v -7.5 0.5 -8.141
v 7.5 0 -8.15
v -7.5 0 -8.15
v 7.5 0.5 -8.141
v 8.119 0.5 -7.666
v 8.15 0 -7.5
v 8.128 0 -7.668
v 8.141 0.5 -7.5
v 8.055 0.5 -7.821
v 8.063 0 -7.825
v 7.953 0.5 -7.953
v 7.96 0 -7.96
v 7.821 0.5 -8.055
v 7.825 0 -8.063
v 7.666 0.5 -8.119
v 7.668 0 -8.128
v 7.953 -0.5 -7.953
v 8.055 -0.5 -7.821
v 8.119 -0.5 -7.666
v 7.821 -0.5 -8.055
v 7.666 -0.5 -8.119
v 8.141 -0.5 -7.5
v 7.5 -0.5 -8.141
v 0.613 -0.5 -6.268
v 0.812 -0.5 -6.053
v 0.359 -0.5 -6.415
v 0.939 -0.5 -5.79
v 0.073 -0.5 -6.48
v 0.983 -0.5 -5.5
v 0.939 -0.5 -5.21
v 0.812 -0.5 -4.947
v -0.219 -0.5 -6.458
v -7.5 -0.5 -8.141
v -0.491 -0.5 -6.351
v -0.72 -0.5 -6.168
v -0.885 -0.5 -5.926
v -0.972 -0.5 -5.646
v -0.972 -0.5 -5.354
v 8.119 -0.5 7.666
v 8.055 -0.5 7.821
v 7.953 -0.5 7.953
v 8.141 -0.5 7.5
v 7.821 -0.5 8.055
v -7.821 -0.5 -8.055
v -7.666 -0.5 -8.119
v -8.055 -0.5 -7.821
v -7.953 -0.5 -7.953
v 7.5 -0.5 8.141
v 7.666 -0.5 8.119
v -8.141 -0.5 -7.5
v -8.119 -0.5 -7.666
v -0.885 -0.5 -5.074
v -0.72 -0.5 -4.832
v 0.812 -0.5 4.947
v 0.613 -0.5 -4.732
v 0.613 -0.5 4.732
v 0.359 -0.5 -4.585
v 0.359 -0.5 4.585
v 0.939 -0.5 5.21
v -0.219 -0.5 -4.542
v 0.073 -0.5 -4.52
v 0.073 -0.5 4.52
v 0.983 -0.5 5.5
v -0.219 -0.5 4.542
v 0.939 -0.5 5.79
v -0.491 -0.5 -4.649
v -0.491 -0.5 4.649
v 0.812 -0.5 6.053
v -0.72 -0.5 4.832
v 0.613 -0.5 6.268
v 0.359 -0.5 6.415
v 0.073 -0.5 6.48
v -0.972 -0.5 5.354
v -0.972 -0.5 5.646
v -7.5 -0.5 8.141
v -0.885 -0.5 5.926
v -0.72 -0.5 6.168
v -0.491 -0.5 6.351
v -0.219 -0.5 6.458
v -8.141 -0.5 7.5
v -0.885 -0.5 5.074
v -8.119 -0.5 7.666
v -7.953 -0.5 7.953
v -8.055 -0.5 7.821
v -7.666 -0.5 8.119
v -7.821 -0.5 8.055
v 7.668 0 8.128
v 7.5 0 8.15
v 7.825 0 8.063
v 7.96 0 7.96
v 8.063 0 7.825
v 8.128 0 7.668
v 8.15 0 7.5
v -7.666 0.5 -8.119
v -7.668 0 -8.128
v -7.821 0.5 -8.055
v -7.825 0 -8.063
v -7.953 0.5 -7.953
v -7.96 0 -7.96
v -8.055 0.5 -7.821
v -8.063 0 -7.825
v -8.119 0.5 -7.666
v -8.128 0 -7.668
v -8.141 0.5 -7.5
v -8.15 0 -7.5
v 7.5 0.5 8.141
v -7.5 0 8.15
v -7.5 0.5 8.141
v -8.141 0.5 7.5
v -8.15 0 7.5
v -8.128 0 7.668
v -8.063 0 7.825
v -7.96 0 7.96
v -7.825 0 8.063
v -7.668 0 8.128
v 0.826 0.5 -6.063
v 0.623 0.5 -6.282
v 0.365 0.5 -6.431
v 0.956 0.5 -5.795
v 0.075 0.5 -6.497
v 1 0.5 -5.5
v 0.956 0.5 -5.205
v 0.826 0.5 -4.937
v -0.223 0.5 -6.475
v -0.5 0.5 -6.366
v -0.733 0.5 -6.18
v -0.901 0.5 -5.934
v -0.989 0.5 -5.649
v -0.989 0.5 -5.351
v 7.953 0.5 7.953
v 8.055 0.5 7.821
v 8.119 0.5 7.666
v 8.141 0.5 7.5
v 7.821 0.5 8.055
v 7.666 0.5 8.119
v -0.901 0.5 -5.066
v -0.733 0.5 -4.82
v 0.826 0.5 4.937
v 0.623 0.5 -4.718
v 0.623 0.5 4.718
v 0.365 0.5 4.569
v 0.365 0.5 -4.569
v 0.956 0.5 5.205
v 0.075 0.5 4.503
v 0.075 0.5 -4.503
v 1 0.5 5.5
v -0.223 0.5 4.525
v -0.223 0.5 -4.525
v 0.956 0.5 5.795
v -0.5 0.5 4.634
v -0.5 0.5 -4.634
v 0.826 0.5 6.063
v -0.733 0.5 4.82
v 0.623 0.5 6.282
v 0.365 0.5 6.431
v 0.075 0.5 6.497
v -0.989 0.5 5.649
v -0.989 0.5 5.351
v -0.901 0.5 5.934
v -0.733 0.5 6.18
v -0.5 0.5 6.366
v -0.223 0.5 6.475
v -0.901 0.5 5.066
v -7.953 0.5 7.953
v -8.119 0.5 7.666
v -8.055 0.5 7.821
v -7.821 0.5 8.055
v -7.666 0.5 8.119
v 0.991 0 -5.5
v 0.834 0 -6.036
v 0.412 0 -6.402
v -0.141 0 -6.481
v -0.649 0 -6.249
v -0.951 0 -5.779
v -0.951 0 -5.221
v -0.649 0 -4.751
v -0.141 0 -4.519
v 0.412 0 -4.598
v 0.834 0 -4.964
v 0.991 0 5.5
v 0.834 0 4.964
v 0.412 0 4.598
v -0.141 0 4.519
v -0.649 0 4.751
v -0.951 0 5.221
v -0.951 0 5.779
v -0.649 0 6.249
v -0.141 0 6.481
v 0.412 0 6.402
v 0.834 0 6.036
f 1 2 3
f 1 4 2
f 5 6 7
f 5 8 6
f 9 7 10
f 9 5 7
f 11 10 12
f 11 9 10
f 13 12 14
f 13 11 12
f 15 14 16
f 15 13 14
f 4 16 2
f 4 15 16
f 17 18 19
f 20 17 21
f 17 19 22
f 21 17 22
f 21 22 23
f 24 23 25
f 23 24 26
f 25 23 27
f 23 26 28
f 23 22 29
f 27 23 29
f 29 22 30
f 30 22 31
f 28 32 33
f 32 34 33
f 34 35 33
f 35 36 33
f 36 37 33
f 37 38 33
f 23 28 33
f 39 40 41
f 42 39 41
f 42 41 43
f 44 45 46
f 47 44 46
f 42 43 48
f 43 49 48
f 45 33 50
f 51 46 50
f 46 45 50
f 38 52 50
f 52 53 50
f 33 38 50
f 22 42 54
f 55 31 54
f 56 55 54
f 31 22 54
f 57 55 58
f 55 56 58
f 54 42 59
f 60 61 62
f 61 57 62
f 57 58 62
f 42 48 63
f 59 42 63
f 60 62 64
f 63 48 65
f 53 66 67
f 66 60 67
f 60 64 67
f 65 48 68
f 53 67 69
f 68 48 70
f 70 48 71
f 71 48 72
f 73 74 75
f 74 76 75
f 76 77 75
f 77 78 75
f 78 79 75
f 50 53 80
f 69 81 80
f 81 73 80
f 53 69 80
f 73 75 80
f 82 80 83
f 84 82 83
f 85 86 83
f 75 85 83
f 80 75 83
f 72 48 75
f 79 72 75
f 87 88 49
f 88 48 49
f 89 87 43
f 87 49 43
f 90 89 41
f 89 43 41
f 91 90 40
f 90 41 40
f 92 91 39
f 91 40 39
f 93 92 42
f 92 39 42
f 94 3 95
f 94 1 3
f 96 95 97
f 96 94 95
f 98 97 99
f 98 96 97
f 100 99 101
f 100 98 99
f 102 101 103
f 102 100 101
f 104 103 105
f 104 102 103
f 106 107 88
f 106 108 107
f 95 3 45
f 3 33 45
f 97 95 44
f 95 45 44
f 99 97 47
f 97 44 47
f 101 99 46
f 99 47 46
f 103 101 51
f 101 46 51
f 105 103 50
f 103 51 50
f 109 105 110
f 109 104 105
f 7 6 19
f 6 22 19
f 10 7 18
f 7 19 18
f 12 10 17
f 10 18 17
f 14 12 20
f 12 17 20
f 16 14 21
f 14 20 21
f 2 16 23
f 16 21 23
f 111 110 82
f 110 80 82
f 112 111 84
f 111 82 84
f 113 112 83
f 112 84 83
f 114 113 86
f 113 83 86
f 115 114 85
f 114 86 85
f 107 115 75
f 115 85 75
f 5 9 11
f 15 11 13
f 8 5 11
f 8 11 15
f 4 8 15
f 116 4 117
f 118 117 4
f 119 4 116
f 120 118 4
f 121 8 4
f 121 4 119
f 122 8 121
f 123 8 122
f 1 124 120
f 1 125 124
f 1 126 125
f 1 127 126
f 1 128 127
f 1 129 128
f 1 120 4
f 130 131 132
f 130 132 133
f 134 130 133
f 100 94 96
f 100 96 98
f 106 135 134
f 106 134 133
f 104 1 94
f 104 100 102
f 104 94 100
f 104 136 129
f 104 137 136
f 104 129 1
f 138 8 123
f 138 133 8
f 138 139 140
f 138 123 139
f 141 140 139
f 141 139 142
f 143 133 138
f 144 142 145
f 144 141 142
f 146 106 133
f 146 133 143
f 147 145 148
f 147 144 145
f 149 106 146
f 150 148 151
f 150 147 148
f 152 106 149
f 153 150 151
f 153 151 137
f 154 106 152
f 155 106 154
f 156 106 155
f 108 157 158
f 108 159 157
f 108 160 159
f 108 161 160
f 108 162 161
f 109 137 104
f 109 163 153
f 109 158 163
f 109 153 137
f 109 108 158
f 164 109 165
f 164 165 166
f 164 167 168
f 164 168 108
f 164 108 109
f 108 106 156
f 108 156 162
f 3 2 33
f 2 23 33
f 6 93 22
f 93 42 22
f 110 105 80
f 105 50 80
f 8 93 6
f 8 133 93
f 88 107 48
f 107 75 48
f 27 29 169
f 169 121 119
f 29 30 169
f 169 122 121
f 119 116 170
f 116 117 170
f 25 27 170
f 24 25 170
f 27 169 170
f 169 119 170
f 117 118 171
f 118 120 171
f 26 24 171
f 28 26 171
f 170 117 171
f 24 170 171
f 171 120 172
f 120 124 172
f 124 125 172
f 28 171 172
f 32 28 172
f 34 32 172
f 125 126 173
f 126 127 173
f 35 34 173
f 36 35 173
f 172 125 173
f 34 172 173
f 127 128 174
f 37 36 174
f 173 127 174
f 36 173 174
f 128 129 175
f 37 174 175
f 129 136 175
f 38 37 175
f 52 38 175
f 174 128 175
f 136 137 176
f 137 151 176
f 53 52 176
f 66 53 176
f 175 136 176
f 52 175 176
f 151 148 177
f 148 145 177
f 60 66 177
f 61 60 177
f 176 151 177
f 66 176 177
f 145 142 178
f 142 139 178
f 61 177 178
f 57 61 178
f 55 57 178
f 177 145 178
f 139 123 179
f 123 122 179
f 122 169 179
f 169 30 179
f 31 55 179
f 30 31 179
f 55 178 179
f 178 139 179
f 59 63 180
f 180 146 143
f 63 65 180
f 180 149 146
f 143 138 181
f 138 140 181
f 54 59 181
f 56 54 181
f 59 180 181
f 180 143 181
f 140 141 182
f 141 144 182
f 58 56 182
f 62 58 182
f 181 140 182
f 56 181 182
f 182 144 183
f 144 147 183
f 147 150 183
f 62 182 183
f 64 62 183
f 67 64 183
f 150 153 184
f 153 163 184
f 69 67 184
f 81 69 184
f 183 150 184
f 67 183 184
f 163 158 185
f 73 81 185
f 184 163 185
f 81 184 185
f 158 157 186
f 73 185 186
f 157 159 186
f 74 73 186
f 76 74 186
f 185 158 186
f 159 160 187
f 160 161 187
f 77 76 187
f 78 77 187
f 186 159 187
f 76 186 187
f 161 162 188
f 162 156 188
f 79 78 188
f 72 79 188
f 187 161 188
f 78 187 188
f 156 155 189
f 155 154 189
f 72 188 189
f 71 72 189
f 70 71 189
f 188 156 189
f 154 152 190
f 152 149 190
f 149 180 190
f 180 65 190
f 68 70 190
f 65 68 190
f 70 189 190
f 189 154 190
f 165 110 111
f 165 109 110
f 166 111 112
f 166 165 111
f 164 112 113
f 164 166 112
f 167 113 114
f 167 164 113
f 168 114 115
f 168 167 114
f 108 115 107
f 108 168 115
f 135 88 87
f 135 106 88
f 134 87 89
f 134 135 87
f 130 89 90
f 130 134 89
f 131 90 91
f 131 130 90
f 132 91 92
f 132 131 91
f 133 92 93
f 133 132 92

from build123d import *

# Parameters (mm, degrees)
BOSS_EXTRUDE1_DEPTH           = 0.5
BOSS_EXTRUDE1_TAPER           = 1
BOSS_EXTRUDE1_OTHER_WAY_DEPTH = 0.5
BOSS_EXTRUDE1_OTHER_WAY_TAPER = 1
SKETCH3_R                     = 1
CUT_EXTRUDE1_DEPTH            = 10
CUT_EXTRUDE1_DRAFT            = -1
CUT_EXTRUDE1_PROFILE_2_DEPTH  = 10
CUT_EXTRUDE1_PROFILE_2_DRAFT  = -1


with BuildPart() as part:
    # Sketch2 → Boss-Extrude1 (new body)
    with BuildSketch(Plane(origin=(0, 0, 0), x_dir=(1, 0, 0), z_dir=(0, 1, 0))):
        with BuildLine():
            Line((-8.149946685, 7.5), (-8.149946685, -7.5))
            ThreePointArc((-8.149946685, -7.5), (-7.959581709, -7.959581709), (-7.5, -8.149946685))
            Line((-7.5, -8.149946685), (7.5, -8.149946685))
            ThreePointArc((7.5, -8.149946685), (7.959581709, -7.959581709), (8.149946685, -7.5))
            Line((8.149946685, -7.5), (8.149946685, 7.5))
            ThreePointArc((8.149946685, 7.5), (7.959581709, 7.959581709), (7.5, 8.149946685))
            Line((7.5, 8.149946685), (-7.5, 8.149946685))
            ThreePointArc((-7.5, 8.149946685), (-7.959581709, 7.959581709), (-8.149946685, 7.5))
        make_face()
    extrude(amount=BOSS_EXTRUDE1_DEPTH, taper=BOSS_EXTRUDE1_TAPER)

    # Sketch2 → Boss-Extrude1 other way (add)
    with BuildSketch(Plane(origin=(0, 0, 0), x_dir=(1, 0, 0), z_dir=(0, 1, 0))):
        with BuildLine():
            Line((-8.149946685, 7.5), (-8.149946685, -7.5))
            ThreePointArc((-8.149946685, -7.5), (-7.959581709, -7.959581709), (-7.5, -8.149946685))
            Line((-7.5, -8.149946685), (7.5, -8.149946685))
            ThreePointArc((7.5, -8.149946685), (7.959581709, -7.959581709), (8.149946685, -7.5))
            Line((8.149946685, -7.5), (8.149946685, 7.5))
            ThreePointArc((8.149946685, 7.5), (7.959581709, 7.959581709), (7.5, 8.149946685))
            Line((7.5, 8.149946685), (-7.5, 8.149946685))
            ThreePointArc((-7.5, 8.149946685), (-7.959581709, 7.959581709), (-8.149946685, 7.5))
        make_face()
    extrude(amount=-BOSS_EXTRUDE1_OTHER_WAY_DEPTH, taper=BOSS_EXTRUDE1_OTHER_WAY_TAPER)


with BuildPart() as cut_extrude1_tool:
    # Sketch3 → Cut-Extrude1 (with draft: the straight prism first)
    with BuildSketch(Plane(origin=(0, 0.5, 0), x_dir=(1, 0, 0), z_dir=(0, 1, 0))):
        with Locations((0, 5.5)):
            Circle(SKETCH3_R)
    extrude(amount=-CUT_EXTRUDE1_DEPTH)
    # Cut-Extrude1: the draft: its side faces are tilted about the plane it starts from
    cut_extrude1_sides = [cut_extrude1_tool.faces().sort_by_distance(p)[0] for p in [
        (-1, -4.5, -5.5),
    ]]
    draft(cut_extrude1_sides, Plane(origin=(0, 0.5, 0), x_dir=(1, 0, 0), z_dir=(0, 1, 0)), CUT_EXTRUDE1_DRAFT)


with BuildPart() as part_1:
    add(part.part)

    # Cut-Extrude1: cut by cut_extrude1_tool
    add(cut_extrude1_tool.part, mode=Mode.SUBTRACT)


with BuildPart() as cut_extrude1_profile_2_tool:
    # Sketch3 → Cut-Extrude1 profile 2 (with draft: the straight prism first)
    with BuildSketch(Plane(origin=(0, 0.5, 0), x_dir=(1, 0, 0), z_dir=(0, 1, 0))):
        with Locations((0, -5.5)):
            Circle(SKETCH3_R)
    extrude(amount=-CUT_EXTRUDE1_PROFILE_2_DEPTH)
    # Cut-Extrude1 profile 2: the draft: its side faces are tilted about the plane it starts from
    cut_extrude1_profile_2_sides = [cut_extrude1_profile_2_tool.faces().sort_by_distance(p)[0] for p in [
        (-1, -4.5, 5.5),
    ]]
    draft(cut_extrude1_profile_2_sides, Plane(origin=(0, 0.5, 0), x_dir=(1, 0, 0), z_dir=(0, 1, 0)), CUT_EXTRUDE1_PROFILE_2_DRAFT)


with BuildPart() as part_2:
    add(part_1.part)

    # Cut-Extrude1 profile 2: cut by cut_extrude1_profile_2_tool
    add(cut_extrude1_profile_2_tool.part, mode=Mode.SUBTRACT)


solid = part_2.part
